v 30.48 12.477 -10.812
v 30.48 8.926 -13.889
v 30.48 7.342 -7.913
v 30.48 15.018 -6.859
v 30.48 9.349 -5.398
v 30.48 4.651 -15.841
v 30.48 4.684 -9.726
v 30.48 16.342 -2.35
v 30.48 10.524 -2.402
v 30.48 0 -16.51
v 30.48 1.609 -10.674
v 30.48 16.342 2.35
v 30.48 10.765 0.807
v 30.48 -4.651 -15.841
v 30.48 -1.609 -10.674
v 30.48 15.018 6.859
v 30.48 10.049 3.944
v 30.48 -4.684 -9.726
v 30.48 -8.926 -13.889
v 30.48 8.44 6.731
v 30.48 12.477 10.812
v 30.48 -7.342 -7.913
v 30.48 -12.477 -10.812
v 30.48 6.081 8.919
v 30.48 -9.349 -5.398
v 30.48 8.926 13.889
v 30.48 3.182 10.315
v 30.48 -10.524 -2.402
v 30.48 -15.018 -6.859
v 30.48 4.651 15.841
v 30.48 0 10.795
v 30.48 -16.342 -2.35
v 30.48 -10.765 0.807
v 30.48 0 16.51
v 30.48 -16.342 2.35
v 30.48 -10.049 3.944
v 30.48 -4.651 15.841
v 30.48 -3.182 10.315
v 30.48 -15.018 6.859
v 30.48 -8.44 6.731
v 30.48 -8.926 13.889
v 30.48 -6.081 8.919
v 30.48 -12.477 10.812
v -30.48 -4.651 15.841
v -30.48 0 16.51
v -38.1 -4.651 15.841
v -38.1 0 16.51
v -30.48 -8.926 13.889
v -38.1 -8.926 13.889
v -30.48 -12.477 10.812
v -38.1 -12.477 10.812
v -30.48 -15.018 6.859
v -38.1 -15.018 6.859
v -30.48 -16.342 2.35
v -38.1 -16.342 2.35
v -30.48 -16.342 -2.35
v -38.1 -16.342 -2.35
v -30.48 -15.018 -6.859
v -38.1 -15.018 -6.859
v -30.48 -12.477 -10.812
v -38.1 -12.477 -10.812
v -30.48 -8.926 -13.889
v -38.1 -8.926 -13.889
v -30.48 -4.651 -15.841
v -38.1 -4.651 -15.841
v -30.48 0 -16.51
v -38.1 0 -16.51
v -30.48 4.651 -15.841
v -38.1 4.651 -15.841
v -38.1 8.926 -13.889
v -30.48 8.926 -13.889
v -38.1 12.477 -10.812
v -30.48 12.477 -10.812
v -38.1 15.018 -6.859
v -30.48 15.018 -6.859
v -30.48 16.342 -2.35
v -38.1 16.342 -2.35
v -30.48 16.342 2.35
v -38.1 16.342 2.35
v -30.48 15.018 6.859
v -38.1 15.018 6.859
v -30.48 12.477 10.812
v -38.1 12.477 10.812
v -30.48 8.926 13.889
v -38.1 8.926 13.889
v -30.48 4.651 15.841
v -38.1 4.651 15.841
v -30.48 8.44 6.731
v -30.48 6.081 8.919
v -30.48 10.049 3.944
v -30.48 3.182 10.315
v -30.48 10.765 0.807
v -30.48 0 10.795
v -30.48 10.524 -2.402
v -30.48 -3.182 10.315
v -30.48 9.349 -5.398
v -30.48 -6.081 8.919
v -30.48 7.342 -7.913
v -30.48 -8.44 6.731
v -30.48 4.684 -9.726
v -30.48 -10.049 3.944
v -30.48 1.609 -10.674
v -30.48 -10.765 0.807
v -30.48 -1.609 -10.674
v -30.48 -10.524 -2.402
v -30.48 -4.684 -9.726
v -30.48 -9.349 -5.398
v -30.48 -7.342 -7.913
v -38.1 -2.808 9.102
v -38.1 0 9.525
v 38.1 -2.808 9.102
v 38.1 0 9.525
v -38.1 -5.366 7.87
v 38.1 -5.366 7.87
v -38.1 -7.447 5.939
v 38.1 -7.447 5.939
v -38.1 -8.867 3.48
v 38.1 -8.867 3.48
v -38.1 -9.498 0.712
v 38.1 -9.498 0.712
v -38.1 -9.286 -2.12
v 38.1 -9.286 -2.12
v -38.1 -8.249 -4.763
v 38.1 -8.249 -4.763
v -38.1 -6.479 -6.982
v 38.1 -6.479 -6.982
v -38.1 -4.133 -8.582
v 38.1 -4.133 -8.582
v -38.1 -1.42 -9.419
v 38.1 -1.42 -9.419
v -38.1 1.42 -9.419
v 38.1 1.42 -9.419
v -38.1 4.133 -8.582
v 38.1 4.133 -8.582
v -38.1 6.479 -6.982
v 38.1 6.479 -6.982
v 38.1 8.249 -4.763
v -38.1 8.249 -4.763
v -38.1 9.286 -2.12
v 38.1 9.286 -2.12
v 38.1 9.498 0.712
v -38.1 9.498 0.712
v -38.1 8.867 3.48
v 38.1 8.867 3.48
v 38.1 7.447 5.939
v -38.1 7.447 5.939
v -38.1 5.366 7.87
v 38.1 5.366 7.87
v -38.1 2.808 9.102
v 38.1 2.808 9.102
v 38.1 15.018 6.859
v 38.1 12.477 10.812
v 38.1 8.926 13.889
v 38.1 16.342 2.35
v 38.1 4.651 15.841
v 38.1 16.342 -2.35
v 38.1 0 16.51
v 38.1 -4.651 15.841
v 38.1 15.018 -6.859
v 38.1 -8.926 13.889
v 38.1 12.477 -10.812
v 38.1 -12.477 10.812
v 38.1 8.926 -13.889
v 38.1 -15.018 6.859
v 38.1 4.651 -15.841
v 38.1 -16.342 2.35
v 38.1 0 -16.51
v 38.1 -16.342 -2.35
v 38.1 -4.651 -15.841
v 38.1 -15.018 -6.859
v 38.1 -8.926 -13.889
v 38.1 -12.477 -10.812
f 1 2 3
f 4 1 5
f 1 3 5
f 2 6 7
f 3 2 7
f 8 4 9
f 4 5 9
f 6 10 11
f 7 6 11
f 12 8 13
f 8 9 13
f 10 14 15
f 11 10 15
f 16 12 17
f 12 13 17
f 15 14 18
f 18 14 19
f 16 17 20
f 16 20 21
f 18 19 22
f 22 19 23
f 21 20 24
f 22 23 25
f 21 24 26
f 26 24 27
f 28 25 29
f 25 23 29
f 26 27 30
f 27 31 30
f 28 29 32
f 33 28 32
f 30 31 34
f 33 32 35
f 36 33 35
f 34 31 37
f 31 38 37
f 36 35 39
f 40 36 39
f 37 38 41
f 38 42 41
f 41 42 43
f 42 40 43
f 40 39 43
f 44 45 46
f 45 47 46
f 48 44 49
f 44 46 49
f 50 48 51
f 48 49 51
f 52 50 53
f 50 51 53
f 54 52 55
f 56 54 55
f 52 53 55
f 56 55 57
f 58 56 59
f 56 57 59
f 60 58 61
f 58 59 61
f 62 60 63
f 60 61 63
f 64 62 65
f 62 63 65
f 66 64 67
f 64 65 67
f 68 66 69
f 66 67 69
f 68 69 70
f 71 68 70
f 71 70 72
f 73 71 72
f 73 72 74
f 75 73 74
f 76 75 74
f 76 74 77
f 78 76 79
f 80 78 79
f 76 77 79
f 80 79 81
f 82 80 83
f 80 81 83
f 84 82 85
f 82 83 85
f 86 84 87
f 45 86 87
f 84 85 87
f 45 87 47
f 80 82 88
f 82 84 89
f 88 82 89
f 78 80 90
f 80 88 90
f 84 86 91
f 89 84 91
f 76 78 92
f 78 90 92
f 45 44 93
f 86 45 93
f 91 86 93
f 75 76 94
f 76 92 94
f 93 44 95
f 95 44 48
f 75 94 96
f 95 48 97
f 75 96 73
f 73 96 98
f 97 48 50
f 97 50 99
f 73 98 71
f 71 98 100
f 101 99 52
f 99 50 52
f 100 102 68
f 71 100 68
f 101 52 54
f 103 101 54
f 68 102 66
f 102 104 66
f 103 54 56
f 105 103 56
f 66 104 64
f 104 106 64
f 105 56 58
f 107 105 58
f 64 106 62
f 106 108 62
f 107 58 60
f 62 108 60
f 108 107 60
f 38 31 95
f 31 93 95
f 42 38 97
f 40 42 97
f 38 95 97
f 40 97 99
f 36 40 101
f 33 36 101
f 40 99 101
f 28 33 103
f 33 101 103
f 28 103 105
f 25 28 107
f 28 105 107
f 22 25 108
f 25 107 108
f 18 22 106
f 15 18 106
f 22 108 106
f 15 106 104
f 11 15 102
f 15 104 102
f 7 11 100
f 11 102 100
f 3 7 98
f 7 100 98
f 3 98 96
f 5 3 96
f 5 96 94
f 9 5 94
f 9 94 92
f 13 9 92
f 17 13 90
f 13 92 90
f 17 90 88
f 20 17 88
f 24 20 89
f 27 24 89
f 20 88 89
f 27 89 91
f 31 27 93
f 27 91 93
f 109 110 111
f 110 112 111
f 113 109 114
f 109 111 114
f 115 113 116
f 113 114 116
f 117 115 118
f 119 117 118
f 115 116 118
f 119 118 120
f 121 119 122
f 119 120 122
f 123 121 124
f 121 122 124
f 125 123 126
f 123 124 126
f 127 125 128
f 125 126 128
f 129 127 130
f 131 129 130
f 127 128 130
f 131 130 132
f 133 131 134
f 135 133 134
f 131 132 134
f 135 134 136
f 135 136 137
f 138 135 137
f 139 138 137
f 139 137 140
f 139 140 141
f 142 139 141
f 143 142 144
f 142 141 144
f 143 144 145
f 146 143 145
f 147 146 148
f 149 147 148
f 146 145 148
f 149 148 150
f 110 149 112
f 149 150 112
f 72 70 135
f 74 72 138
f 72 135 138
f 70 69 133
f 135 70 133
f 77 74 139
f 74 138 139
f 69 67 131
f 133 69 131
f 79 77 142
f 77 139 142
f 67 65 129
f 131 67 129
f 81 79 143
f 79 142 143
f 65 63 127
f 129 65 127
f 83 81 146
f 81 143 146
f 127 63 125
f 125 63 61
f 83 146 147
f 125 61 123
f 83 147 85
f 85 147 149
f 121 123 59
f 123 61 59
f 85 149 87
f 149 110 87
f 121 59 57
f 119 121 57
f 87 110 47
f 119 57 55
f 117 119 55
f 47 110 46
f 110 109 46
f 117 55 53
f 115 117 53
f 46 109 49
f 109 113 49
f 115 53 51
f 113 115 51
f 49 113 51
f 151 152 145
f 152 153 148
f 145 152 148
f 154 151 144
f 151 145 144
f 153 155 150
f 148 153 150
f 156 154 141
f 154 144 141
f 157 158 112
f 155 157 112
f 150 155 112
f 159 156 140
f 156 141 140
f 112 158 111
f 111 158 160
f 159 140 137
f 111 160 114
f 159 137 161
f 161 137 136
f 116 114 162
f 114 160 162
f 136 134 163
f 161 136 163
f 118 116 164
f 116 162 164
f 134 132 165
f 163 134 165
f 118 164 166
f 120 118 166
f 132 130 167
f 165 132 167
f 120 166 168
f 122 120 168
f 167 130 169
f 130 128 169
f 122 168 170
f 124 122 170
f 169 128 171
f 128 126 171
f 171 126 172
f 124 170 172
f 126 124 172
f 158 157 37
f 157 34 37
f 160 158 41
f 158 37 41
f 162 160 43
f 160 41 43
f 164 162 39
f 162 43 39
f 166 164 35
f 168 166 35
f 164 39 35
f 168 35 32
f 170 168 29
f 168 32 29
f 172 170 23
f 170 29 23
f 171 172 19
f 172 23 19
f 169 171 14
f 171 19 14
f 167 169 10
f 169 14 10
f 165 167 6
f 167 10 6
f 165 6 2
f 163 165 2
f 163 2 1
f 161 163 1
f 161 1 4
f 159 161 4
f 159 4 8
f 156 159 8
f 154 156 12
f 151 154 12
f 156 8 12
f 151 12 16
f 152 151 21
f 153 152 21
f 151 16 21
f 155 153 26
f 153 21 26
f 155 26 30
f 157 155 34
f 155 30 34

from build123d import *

# Parameters (mm, degrees)
SKETCH1_W = 30.48
SKETCH1_H = 1.27


with BuildPart() as part:
    # Sketch1 → Revolve2 (revolve)
    with BuildSketch(Plane.XY, mode=Mode.PRIVATE) as revolve2_sk:
        with Locations((15.24, 10.16)):
            Rectangle(SKETCH1_W, SKETCH1_H)
        with Locations((-15.24, 10.16)):
            Rectangle(SKETCH1_W, SKETCH1_H)
        Polygon((30.48, 10.795), (30.48, 9.525), (38.1, 9.525), (38.1, 16.51), (30.48, 16.51), align=None)
        Polygon((-38.1, 9.525), (-30.48, 9.525), (-30.48, 10.795), (-30.48, 16.51), (-38.1, 16.51), align=None)
    revolve(revolve2_sk.sketch.rotate(Axis((-30.48, 0, 0), (1, 0, 0)), 90), axis=Axis((-30.48, 0, 0), (1, 0, 0)))


solid = part.part
